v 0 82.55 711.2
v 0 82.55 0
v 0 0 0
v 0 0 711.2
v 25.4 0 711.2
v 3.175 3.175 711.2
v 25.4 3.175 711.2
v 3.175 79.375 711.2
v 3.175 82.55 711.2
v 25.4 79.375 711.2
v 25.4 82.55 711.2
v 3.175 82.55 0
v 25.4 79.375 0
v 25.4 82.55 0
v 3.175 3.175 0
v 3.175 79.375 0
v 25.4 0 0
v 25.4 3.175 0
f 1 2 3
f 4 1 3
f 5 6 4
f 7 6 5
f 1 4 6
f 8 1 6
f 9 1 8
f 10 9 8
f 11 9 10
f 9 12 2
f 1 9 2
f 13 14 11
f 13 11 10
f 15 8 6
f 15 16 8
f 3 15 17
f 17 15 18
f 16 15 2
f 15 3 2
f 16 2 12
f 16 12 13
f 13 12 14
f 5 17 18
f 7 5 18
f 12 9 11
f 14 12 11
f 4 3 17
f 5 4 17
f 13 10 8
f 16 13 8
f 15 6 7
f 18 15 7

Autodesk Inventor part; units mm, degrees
ref_plane "YZ Plane" through (0, 0, 0) normal (1, 0, 0) x (0, 1, 0)
ref_plane "XZ Plane" through (0, 0, 0) normal (0, 1, 0) x (-1, 0, 0)
ref_plane "XY Plane" through (0, 0, 0) normal (0, 0, 1) x (1, 0, 0)
sketch "Sketch1" plane through (0, 0, 0) normal (0, 0, 1) x (1, 0, 0)
  line L0 (0, 0) -> (25.4, 0)
  line L1 (25.4, 0) -> (25.4, 3.175)
  line L2 (3.175, 82.55) -> (0, 82.55)
  line L3 (0, 82.55) -> (0, 0)
  line L4 (3.175, 79.375) -> (3.175, 3.175)
  line L5 (3.175, 3.175) -> (25.4, 3.175)
  line L6 (3.175, 82.55) -> (25.4, 82.55)
  line L7 (25.4, 82.55) -> (25.4, 79.375)
  line L8 (25.4, 79.375) -> (3.175, 79.375)
  dimension "d0" = 82.55
  dimension "d1" = 25.4
  dimension "d2" = 3.175
  dimension "d3" = 3.175
  dimension "d6" = 3.175
  dimension "d7" = 25.4
extrude "Extrusion1" add sketch "Sketch1" along normal blind 711.2
equation "\"d3\" = d2"
equation "\"d6\" = d3"
equation "\"d7\" = d1"
properties part number "frame 7 outside U"
